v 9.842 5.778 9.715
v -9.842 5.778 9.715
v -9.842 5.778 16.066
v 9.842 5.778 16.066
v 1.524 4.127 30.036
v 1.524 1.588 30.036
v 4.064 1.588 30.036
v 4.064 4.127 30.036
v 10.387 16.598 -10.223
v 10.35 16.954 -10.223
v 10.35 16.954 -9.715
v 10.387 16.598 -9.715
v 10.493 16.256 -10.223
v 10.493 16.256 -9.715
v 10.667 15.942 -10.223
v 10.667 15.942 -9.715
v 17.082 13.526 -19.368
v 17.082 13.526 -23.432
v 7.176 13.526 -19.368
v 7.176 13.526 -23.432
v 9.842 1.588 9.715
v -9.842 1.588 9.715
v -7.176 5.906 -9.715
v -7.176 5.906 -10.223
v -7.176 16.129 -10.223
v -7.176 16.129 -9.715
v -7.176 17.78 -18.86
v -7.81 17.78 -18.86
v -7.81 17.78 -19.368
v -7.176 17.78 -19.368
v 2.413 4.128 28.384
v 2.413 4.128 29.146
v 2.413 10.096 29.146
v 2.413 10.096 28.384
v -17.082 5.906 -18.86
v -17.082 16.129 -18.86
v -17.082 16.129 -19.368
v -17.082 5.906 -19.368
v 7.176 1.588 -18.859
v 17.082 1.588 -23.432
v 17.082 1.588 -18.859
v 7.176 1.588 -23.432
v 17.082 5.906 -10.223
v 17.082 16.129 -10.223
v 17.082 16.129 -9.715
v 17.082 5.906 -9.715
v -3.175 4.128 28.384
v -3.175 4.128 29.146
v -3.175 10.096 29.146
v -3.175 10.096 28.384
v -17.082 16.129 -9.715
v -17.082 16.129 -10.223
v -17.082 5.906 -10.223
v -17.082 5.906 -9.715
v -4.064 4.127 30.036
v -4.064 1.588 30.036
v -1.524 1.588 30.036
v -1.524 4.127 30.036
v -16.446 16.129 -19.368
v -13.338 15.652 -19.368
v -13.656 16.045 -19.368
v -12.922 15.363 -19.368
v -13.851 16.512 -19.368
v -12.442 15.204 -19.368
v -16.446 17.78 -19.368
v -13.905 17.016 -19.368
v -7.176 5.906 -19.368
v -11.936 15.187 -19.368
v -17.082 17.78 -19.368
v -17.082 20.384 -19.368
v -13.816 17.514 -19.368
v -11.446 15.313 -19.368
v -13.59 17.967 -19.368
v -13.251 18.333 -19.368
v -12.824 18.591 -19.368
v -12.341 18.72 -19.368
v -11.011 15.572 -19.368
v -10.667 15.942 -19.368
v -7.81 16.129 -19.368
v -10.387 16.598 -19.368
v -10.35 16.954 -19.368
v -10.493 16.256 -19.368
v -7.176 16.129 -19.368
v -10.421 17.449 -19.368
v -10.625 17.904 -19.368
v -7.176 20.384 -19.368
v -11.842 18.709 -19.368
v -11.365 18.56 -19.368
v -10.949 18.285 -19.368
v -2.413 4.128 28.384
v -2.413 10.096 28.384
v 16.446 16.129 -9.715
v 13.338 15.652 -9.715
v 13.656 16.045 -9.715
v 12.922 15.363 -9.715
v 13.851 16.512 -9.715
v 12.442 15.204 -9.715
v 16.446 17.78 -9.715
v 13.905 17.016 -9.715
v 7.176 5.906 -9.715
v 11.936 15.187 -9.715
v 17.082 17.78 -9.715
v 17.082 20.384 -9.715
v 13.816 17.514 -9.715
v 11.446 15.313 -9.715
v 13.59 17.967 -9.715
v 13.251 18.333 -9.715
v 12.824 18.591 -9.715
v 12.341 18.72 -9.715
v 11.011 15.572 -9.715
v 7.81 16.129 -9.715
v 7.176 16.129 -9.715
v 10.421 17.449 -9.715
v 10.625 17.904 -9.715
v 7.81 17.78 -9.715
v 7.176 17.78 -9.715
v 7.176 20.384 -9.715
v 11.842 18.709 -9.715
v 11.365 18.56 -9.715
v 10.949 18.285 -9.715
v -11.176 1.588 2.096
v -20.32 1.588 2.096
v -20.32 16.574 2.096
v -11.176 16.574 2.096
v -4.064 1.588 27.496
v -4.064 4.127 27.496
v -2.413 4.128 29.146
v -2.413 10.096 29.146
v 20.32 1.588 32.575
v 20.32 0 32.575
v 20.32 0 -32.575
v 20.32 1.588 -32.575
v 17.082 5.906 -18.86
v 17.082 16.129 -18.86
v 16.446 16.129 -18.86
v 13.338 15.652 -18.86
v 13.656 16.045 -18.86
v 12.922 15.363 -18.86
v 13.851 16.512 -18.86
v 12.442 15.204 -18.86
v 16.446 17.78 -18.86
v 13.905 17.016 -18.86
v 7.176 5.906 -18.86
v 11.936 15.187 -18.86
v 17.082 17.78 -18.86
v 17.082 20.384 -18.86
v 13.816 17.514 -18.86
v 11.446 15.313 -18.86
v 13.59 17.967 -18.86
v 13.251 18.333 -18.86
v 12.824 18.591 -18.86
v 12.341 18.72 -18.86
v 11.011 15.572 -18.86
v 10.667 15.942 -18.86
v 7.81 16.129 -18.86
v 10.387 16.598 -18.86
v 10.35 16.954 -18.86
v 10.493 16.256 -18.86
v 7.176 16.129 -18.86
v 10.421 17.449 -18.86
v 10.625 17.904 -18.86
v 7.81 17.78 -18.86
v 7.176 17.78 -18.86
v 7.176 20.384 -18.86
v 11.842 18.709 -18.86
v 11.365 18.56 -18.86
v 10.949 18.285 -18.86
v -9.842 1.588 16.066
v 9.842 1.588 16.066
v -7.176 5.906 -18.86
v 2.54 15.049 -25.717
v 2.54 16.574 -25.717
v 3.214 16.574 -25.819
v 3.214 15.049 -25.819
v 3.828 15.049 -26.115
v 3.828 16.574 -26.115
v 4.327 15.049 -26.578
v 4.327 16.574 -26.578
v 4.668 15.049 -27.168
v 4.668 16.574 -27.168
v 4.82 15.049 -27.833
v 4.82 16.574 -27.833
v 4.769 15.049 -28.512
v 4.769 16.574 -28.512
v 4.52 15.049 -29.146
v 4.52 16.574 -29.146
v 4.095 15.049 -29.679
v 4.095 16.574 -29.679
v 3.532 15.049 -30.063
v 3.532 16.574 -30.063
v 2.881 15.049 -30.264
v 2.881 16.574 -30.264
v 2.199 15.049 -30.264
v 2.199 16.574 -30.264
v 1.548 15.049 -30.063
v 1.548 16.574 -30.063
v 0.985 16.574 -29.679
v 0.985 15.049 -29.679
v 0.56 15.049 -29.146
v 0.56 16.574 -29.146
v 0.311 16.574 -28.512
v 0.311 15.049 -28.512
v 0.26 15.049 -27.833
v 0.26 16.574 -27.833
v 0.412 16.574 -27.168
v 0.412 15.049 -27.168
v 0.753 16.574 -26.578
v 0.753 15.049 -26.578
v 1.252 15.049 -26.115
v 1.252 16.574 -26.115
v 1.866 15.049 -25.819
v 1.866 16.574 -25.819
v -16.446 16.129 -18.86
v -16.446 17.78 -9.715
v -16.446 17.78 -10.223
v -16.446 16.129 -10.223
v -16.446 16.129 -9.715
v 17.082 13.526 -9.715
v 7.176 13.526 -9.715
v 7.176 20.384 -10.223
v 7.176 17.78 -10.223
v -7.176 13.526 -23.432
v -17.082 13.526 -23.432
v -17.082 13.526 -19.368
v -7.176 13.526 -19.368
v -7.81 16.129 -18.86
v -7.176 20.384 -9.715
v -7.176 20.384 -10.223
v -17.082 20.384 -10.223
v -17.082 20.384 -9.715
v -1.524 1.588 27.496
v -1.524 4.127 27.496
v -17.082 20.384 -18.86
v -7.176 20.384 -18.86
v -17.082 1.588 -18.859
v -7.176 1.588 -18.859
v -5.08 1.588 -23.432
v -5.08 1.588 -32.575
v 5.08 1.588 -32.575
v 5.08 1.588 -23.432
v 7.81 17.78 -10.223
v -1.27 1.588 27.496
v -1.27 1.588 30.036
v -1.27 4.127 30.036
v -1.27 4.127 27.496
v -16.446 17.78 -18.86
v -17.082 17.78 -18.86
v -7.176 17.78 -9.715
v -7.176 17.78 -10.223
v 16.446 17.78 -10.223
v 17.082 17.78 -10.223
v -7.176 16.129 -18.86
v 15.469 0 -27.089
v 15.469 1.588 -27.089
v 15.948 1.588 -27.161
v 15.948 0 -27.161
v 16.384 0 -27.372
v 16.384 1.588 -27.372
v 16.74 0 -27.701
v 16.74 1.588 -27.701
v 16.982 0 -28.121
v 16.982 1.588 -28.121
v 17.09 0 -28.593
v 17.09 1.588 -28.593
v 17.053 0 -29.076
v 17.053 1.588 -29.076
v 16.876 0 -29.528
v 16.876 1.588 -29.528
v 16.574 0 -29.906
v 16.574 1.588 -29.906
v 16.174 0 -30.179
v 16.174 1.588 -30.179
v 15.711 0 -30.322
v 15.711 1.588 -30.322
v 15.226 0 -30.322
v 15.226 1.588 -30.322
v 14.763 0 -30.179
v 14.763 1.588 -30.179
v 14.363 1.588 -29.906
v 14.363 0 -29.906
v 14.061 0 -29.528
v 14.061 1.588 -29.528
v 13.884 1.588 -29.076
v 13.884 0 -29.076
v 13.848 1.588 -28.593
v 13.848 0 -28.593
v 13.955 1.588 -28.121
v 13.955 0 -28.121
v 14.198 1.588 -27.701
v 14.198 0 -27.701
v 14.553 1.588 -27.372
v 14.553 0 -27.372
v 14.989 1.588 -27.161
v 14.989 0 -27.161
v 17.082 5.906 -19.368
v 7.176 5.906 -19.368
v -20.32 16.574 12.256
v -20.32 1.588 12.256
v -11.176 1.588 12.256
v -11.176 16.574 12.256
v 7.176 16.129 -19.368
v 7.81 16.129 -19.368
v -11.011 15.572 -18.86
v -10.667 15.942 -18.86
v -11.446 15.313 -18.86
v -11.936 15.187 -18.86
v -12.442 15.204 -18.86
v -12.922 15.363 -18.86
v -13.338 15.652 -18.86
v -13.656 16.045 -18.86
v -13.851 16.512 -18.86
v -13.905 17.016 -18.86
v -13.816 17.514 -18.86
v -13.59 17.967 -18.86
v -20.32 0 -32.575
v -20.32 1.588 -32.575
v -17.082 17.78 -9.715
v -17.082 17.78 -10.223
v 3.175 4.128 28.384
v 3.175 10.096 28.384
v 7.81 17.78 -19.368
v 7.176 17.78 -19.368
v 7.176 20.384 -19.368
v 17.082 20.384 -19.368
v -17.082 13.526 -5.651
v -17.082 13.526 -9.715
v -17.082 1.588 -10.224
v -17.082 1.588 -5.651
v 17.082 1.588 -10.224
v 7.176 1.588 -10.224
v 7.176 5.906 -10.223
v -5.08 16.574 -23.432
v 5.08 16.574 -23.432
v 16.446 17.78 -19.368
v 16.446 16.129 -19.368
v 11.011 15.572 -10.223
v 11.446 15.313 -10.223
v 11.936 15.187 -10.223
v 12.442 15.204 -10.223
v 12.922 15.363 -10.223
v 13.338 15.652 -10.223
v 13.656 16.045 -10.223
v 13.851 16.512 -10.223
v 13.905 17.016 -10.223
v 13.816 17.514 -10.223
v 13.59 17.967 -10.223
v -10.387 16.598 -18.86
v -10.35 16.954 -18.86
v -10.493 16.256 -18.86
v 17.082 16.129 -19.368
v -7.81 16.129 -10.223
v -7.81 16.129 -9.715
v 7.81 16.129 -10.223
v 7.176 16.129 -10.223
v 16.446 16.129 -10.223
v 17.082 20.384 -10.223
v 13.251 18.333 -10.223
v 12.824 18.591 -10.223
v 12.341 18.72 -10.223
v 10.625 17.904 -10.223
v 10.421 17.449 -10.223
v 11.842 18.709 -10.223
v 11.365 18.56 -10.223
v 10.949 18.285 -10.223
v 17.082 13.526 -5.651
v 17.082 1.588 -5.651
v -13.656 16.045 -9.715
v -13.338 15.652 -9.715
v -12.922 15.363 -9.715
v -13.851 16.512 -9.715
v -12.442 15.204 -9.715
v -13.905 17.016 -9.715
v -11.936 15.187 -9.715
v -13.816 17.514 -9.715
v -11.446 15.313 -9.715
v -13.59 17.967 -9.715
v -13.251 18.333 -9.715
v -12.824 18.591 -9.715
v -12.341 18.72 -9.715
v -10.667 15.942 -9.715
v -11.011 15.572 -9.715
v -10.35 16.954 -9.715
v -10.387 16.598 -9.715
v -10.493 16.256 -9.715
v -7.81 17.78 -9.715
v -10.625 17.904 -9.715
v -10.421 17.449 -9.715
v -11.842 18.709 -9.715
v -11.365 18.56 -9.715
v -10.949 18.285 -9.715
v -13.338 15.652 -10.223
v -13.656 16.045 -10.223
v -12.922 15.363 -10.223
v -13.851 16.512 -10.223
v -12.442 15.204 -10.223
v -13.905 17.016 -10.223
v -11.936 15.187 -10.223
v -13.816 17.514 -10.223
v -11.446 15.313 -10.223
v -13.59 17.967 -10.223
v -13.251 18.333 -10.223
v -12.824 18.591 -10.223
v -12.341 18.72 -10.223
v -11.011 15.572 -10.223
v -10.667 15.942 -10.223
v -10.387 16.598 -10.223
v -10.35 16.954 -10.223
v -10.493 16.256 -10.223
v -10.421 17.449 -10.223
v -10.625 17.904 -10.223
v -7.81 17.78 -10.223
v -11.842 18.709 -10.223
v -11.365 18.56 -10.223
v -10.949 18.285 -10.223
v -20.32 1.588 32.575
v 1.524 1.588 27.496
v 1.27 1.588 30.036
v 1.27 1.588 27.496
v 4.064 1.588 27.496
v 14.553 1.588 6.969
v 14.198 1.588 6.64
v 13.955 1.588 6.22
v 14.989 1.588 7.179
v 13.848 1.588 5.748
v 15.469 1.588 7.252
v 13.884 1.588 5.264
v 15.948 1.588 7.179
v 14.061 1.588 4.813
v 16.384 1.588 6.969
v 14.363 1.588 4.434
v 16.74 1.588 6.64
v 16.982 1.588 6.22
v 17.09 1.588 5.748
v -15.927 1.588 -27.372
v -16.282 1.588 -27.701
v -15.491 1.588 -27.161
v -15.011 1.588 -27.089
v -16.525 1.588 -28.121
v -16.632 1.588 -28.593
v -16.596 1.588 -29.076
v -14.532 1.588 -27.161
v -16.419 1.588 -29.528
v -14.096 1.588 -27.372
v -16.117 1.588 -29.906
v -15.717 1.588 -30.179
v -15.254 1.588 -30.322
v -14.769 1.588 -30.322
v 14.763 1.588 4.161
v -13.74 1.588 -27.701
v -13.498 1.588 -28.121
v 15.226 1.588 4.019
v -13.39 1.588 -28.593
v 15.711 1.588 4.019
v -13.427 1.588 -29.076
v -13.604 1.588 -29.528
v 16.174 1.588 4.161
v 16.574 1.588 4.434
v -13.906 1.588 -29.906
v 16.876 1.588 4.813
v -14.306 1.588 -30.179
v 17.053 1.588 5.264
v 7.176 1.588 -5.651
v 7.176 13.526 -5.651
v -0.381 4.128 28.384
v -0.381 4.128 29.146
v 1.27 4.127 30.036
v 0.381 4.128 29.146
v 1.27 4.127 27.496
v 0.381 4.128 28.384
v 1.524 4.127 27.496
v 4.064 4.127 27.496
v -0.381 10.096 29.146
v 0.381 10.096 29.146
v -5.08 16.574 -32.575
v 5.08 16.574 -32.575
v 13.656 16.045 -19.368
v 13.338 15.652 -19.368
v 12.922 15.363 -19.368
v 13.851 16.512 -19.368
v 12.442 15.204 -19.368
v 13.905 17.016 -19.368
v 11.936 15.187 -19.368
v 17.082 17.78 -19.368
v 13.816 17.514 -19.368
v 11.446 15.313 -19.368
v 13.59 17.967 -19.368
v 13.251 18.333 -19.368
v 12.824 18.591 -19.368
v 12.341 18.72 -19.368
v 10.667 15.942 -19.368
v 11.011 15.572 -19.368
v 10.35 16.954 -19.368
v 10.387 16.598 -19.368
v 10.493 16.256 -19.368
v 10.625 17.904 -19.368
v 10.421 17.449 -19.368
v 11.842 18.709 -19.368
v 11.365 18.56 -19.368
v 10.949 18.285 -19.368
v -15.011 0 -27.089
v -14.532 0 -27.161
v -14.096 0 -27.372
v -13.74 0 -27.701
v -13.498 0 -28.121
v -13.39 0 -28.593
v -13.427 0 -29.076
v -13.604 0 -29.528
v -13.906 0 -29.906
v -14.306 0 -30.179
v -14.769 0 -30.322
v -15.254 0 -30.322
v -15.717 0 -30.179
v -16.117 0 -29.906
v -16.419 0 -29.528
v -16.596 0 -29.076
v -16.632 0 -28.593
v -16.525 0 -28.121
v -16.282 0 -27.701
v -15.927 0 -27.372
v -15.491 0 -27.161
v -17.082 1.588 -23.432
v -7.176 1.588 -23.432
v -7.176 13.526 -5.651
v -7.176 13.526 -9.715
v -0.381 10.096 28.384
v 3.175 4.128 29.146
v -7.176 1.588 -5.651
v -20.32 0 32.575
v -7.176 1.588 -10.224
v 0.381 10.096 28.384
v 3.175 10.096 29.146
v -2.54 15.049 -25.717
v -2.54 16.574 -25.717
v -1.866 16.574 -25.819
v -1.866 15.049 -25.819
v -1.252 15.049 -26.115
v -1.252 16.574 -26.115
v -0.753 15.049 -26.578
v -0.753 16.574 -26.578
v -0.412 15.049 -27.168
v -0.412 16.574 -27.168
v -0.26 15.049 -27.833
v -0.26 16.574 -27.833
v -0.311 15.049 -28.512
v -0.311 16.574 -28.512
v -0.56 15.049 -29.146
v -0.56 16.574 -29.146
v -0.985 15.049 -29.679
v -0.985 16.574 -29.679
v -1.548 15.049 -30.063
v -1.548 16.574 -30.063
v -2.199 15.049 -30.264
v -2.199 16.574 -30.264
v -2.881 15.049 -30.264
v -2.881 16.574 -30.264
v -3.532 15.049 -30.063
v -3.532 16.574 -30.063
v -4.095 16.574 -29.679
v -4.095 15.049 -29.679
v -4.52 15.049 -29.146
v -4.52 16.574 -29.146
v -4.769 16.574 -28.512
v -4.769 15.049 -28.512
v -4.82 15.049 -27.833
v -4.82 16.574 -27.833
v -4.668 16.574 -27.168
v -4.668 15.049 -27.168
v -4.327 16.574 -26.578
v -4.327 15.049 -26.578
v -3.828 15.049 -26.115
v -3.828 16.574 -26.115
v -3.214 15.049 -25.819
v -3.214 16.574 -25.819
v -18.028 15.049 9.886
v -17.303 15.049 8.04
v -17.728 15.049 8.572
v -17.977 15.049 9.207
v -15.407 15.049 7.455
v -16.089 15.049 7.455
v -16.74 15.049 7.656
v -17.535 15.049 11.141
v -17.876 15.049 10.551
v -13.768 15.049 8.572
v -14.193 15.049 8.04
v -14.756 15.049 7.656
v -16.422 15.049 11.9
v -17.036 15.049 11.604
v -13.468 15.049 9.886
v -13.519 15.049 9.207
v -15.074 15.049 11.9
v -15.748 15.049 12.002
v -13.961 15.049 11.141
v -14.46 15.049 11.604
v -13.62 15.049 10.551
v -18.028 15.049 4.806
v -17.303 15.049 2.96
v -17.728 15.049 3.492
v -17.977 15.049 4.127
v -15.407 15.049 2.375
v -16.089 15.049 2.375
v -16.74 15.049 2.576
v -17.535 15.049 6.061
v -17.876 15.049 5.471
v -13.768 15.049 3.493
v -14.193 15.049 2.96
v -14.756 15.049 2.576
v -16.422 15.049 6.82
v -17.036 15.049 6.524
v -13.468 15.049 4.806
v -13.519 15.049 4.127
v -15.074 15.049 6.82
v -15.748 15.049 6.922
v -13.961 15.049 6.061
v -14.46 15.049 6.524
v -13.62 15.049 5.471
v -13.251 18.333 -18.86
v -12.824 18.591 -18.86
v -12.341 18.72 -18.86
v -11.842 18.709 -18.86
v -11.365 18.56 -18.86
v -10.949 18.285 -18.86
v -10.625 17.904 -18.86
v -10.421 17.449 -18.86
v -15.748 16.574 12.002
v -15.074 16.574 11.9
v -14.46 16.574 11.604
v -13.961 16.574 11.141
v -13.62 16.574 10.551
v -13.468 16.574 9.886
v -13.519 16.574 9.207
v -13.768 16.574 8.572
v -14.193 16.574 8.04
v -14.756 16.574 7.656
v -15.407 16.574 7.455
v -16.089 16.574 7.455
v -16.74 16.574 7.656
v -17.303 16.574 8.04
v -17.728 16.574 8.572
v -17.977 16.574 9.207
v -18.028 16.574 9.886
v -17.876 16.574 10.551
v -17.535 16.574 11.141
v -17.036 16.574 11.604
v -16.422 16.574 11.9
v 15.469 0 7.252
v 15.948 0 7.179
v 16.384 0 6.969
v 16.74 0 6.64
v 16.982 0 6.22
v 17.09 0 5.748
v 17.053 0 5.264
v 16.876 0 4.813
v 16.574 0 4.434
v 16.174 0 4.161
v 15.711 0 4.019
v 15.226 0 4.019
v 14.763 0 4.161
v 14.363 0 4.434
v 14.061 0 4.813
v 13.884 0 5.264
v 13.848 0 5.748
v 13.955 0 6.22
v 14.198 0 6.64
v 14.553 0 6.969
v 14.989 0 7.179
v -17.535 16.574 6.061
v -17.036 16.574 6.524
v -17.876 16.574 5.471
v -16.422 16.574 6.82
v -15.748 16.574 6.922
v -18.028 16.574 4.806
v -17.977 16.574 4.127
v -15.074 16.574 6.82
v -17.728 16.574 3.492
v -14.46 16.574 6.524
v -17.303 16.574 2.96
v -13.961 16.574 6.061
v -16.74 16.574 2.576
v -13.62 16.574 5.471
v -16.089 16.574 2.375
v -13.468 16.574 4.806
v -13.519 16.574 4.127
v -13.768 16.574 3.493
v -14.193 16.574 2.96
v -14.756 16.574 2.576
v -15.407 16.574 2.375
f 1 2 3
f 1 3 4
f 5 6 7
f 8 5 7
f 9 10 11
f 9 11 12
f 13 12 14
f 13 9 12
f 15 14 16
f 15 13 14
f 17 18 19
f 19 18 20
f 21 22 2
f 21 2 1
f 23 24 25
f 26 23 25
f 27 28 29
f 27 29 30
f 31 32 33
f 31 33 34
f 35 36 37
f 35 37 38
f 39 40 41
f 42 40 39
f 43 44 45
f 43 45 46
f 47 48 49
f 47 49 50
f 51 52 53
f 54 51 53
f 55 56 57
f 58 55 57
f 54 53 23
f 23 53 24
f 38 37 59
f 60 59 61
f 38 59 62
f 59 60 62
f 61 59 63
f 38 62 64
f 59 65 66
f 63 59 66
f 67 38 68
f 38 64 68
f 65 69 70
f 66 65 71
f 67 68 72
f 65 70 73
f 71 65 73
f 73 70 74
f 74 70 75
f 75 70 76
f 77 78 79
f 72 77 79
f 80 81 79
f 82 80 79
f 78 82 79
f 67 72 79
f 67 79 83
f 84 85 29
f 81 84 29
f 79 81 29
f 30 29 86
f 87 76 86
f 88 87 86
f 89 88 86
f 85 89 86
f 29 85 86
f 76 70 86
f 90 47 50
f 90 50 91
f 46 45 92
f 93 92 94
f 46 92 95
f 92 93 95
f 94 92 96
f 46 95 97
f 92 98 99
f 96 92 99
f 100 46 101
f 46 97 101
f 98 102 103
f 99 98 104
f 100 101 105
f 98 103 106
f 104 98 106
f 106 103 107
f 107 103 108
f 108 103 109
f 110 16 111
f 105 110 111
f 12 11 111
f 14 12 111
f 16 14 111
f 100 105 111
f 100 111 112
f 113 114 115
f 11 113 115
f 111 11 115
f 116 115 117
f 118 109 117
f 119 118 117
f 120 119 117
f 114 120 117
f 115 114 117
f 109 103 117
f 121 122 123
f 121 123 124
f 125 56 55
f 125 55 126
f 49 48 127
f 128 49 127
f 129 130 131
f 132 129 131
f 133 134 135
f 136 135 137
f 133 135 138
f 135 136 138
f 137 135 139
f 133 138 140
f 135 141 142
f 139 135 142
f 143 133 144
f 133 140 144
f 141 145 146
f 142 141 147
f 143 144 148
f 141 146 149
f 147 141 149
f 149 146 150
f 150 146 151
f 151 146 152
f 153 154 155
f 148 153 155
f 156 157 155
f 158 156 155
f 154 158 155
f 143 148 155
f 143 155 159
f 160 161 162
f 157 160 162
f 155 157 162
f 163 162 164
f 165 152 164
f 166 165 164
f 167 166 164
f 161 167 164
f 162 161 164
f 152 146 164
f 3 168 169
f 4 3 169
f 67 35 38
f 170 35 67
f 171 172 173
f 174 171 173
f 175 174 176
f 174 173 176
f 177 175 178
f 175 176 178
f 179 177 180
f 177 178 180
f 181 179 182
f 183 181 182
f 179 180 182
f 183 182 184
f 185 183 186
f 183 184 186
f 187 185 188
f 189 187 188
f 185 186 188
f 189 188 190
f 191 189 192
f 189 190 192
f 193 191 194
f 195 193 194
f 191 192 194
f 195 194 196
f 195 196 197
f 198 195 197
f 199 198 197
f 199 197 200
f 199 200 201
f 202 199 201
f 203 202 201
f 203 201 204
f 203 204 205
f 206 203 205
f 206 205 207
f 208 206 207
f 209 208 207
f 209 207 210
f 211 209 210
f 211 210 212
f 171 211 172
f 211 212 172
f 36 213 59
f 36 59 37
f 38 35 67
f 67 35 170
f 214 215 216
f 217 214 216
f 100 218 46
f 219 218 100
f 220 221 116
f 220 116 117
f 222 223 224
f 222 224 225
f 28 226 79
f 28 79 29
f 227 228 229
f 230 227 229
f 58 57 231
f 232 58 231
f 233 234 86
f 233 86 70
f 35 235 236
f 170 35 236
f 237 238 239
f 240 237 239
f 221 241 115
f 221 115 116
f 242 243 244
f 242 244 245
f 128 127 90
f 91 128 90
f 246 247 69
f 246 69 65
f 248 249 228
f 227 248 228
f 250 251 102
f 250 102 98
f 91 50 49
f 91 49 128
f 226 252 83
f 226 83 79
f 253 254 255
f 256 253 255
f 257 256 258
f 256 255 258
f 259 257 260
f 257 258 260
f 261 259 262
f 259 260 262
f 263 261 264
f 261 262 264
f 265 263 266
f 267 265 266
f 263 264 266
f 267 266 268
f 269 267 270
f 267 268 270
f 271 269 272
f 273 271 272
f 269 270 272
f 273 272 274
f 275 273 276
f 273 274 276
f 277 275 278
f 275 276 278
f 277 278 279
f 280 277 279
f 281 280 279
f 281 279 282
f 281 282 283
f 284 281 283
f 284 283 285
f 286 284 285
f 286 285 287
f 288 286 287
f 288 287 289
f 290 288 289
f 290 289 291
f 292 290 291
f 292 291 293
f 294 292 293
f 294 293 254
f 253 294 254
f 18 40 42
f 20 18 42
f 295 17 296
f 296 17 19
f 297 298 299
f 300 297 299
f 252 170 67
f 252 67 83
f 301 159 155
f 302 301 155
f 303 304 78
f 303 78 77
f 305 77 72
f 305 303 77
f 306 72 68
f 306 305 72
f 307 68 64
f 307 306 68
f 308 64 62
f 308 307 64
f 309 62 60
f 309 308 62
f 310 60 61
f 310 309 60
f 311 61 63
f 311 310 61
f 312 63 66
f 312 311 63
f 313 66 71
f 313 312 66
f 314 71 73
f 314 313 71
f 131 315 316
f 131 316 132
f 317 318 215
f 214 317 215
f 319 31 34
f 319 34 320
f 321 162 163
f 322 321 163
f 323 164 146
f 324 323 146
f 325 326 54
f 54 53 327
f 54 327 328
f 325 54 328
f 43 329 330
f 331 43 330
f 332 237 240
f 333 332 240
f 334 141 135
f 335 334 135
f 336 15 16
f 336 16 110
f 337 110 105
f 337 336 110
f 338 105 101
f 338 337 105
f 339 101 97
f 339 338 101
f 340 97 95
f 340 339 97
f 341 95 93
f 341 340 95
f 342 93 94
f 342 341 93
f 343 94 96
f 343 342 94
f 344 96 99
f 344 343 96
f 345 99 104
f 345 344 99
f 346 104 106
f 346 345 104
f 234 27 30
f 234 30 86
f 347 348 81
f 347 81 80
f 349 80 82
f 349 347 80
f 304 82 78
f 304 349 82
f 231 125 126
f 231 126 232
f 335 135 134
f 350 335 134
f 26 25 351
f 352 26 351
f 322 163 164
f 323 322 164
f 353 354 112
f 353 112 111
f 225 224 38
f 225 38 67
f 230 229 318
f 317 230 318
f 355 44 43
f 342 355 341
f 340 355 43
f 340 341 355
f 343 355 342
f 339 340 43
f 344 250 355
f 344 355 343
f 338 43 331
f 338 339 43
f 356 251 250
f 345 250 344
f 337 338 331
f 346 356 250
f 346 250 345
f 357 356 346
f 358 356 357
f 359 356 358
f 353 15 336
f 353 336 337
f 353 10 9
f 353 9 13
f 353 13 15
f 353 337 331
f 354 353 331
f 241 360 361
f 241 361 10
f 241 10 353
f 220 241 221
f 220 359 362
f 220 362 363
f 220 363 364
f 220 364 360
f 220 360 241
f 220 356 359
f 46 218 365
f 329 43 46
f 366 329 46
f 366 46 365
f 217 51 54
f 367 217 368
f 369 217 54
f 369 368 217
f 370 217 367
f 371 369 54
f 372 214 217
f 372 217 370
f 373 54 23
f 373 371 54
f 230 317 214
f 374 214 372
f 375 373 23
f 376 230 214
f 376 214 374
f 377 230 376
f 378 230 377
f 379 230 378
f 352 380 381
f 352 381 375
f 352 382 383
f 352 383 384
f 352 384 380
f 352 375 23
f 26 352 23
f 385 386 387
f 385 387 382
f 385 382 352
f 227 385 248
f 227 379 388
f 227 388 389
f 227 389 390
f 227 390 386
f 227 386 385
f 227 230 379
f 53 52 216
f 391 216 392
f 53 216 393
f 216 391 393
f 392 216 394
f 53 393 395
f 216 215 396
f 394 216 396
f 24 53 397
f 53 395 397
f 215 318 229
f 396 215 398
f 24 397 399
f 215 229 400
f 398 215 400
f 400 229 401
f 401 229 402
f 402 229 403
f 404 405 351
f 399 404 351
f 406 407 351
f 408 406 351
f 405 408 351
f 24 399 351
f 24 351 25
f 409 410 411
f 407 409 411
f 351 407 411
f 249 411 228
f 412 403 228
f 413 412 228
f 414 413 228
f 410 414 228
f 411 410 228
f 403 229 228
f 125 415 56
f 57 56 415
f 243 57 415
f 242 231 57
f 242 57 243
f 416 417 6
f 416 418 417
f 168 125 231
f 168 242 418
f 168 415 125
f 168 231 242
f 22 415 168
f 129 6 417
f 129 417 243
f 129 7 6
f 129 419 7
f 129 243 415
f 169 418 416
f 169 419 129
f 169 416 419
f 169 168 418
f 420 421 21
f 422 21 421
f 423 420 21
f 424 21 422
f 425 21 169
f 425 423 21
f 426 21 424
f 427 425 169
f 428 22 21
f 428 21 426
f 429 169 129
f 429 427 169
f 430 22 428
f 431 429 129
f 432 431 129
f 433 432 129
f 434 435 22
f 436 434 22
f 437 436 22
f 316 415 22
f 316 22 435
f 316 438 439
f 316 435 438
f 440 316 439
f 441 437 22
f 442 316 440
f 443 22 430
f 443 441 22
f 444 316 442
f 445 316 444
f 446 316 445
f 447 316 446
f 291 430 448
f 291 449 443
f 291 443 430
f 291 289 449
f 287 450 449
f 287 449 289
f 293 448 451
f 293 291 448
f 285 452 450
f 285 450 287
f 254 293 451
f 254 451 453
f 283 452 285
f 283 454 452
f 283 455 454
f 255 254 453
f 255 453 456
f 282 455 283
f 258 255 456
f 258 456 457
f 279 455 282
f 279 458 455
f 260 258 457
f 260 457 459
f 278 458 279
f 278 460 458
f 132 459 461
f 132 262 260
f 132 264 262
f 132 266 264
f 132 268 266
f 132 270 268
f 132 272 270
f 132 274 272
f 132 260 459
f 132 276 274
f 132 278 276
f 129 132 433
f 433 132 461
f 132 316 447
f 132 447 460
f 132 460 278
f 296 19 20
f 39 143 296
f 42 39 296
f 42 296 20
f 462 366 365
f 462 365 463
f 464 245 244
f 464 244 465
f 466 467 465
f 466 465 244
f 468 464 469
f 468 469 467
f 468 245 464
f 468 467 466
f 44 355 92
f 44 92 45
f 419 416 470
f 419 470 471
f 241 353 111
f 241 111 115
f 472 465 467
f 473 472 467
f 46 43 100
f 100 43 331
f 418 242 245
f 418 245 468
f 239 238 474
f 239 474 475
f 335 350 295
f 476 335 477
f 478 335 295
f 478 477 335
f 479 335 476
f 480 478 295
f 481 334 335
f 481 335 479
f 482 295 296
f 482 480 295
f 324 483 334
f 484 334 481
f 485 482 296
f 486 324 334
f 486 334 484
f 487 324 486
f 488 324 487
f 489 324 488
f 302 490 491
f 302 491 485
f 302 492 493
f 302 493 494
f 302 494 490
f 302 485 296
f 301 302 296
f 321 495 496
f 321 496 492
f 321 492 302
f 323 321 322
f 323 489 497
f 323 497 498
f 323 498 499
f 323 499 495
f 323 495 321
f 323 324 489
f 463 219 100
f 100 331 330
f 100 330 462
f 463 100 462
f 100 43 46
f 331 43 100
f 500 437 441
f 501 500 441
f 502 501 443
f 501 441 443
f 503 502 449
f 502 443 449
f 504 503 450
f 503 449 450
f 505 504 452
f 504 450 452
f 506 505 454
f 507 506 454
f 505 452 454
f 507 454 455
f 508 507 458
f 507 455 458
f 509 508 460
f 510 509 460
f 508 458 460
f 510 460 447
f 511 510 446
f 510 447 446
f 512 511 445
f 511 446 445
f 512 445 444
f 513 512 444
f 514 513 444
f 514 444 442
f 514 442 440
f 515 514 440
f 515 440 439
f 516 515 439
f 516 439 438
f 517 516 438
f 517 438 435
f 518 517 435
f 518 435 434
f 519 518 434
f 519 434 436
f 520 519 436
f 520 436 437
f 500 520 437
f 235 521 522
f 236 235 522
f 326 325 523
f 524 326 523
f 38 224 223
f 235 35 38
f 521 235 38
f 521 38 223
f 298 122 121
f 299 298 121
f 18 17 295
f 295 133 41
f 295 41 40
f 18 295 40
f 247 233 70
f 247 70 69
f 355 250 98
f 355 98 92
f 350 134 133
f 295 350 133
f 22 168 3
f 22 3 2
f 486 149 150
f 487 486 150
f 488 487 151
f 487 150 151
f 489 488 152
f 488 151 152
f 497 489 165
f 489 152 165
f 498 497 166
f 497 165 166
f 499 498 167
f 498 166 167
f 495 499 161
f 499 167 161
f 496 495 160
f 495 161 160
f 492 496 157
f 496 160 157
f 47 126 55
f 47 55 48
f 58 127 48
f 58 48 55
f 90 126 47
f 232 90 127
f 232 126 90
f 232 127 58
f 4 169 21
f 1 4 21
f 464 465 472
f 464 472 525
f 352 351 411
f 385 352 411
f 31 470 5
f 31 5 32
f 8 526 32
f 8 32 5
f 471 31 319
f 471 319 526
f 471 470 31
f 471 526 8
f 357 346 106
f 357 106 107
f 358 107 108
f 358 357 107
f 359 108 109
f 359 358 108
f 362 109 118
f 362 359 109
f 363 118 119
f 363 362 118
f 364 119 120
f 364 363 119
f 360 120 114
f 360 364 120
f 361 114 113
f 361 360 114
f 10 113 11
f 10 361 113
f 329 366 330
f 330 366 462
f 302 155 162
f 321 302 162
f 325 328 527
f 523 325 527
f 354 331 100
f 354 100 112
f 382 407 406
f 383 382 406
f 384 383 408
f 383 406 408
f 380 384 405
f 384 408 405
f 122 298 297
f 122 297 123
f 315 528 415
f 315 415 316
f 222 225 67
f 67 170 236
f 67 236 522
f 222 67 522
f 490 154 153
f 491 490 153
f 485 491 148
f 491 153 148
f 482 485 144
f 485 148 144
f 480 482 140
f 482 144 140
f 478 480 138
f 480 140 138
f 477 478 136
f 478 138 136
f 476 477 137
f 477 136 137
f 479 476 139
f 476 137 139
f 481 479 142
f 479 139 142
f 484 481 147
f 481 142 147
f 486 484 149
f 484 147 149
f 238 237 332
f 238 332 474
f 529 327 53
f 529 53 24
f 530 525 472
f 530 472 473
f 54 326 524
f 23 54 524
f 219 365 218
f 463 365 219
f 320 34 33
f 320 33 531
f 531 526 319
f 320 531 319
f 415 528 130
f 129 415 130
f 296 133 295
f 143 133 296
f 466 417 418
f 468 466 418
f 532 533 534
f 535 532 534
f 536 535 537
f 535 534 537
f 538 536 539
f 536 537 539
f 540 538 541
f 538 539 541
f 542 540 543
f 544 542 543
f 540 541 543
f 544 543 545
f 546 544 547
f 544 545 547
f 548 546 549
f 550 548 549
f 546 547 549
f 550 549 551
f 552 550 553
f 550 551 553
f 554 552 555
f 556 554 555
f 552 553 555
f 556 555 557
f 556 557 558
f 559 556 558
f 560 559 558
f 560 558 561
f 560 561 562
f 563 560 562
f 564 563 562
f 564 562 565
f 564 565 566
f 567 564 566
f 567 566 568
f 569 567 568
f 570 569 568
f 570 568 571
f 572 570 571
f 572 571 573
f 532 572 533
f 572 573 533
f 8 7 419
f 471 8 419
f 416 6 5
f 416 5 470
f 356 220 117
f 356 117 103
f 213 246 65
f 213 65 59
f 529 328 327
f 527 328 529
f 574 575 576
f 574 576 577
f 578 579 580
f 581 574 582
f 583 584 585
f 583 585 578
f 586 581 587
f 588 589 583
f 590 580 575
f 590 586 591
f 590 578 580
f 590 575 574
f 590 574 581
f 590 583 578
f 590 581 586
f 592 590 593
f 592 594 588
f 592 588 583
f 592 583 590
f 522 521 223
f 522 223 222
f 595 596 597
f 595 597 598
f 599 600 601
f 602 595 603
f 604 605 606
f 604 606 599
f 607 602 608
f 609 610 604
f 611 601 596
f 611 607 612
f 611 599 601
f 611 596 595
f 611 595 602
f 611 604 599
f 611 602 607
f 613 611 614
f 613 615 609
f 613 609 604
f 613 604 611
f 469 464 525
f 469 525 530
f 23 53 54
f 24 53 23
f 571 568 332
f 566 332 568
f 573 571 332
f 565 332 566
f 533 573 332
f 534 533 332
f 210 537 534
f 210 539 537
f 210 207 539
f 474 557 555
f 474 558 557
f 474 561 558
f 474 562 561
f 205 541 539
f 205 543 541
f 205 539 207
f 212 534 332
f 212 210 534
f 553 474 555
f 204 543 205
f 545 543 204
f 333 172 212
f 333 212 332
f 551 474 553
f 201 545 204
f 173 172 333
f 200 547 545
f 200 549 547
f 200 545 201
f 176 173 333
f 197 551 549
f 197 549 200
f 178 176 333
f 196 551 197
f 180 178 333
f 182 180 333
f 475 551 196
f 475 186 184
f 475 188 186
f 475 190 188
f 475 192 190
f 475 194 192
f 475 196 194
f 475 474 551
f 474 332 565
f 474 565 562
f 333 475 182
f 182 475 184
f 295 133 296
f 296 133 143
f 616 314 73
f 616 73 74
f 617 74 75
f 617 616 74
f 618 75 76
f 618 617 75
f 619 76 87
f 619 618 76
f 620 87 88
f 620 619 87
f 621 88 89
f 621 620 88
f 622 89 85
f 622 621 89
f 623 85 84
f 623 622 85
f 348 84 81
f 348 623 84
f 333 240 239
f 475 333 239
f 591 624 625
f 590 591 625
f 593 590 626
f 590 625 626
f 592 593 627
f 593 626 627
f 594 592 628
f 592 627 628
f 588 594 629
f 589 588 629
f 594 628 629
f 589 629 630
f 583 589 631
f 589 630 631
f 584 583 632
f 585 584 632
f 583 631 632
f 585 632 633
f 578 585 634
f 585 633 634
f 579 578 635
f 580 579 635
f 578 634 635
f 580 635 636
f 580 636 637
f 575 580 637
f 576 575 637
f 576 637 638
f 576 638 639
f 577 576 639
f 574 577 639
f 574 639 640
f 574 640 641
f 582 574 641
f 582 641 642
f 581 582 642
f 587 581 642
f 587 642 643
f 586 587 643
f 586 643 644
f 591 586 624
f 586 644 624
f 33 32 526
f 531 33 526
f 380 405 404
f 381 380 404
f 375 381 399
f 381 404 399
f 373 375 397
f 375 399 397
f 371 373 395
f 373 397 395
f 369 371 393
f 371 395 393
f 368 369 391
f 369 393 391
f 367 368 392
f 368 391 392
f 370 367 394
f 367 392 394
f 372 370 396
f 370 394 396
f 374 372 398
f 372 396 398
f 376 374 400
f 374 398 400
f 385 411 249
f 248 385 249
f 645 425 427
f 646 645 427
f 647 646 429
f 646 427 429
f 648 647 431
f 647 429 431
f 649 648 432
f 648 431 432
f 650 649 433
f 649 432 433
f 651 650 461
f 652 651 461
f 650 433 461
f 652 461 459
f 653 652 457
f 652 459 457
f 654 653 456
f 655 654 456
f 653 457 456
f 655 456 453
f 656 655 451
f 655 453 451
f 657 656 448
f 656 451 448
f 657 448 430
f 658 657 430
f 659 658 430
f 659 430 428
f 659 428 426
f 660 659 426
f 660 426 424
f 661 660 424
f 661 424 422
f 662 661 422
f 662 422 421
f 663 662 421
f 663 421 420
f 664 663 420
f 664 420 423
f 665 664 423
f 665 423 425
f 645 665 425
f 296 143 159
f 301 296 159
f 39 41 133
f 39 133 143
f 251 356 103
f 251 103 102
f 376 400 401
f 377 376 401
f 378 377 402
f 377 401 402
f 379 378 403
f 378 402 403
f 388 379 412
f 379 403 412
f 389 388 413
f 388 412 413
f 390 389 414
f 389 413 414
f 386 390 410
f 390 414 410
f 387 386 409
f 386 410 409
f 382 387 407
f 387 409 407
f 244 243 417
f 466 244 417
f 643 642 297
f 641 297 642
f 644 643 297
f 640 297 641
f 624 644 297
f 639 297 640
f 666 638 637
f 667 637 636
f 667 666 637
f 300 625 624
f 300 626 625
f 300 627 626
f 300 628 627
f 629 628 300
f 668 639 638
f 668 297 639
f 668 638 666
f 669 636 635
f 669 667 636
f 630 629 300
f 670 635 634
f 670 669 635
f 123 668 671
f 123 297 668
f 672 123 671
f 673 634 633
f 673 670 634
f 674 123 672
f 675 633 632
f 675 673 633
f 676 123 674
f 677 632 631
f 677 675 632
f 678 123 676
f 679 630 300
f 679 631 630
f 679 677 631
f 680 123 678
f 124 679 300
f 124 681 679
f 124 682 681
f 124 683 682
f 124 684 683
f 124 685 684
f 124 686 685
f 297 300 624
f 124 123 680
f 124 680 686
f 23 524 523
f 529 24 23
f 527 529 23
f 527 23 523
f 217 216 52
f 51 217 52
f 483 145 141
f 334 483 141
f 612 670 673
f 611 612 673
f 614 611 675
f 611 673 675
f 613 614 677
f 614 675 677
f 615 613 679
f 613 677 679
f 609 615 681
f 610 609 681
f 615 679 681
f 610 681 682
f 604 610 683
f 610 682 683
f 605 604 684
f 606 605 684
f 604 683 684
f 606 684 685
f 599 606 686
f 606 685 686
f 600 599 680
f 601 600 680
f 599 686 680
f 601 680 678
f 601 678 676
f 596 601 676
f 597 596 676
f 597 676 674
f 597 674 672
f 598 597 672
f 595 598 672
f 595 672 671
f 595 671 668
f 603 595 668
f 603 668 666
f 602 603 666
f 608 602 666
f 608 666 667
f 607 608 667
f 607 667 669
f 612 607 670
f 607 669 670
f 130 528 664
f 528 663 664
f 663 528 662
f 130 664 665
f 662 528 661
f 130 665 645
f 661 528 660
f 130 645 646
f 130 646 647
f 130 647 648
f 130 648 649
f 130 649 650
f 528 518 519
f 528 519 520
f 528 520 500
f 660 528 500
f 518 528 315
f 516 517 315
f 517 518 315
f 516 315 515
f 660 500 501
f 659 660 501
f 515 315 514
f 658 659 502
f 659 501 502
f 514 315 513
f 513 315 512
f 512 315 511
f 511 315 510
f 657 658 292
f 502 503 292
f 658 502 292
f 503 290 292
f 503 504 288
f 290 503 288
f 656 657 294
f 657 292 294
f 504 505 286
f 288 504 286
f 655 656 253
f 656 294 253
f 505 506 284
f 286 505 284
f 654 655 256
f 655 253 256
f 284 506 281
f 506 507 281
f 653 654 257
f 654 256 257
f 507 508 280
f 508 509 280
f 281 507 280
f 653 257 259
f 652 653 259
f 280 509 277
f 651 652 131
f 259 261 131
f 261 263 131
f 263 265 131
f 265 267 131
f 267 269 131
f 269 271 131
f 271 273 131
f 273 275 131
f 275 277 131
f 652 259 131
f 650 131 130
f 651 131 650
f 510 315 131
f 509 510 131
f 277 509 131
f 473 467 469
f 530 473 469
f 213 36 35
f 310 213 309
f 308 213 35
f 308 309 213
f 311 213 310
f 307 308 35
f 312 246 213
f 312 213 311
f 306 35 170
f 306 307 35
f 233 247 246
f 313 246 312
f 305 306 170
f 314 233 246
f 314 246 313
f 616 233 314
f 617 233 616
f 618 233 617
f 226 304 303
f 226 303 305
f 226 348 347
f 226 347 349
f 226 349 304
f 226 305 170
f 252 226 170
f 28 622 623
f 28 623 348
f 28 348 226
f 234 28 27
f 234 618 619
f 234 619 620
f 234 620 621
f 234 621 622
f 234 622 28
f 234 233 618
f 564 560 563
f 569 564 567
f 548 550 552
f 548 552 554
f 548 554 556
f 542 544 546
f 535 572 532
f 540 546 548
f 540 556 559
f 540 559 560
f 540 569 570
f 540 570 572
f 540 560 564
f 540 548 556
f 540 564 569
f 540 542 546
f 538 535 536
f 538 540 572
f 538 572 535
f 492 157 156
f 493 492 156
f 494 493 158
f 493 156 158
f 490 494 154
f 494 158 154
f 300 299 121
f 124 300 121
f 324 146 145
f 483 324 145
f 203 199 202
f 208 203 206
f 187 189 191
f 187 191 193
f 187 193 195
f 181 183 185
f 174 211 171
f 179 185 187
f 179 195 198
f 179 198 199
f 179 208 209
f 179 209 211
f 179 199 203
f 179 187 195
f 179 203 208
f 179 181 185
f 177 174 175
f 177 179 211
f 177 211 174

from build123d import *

# Parameters (mm, degrees)
SKETCH1_W           = 40.64
SKETCH1_H           = 65.151
BOSS_EXTRUDE1_DEPTH = 1.5875
SKETCH2_R           = 1.6256
CUT_EXTRUDE1_DEPTH  = 39.426367985
SKETCH3_W           = 9.144
SKETCH3_H           = 10.16
SKETCH3_R           = 2.286
SKETCH3_W_2         = 10.16
SKETCH3_H_2         = 9.144
BOSS_EXTRUDE2_DEPTH = 14.986
CUT_EXTRUDE2_START  = 14.986
SKETCH3_3_R         = 2.286
CUT_EXTRUDE2_DEPTH  = 1.524
SKETCH4_W           = 9.906
SKETCH4_H           = 4.572
BOSS_EXTRUDE3_DEPTH = 11.938
SKETCH5_W           = 9.906
SKETCH5_H           = 7.62
BOSS_EXTRUDE4_DEPTH = 0.508
SKETCH5_3_W         = 9.906
SKETCH5_3_H         = 7.62
CUT_EXTRUDE3_DEPTH  = 0.508
SKETCH6_W           = 2.54
SKETCH6_H           = 2.54
BOSS_EXTRUDE5_DEPTH = 2.54
SKETCH7_W           = 0.762
SKETCH7_H           = 0.762
BOSS_EXTRUDE6_DEPTH = 5.969
SKETCH8_W           = 19.685
SKETCH8_H           = 6.35
BOSS_EXTRUDE7_DEPTH = 4.191


with BuildPart() as part:
    # Sketch1 → Boss-Extrude1 (new body)
    with BuildSketch(Plane(origin=(0, 0, 0), x_dir=(1, 0, 0), z_dir=(0, 1, 0))):
        Rectangle(SKETCH1_W, SKETCH1_H)
    extrude(amount=BOSS_EXTRUDE1_DEPTH)

    # Sketch2 → Cut-Extrude1 (cut, through all)
    with BuildSketch(Plane(origin=(0, 1.5875, 0), x_dir=(1, 0, 0), z_dir=(0, 1, 0))):
        with Locations(Location((-15.0114, 28.7147, 0), (0, 0, 270))):
            Circle(SKETCH2_R)
        with Locations(Location((15.4686, 28.7147, 0), (0, 0, 270))):
            Circle(SKETCH2_R)
        with Locations(Location((15.4686, -5.6261, 0), (0, 0, 270))):
            Circle(SKETCH2_R)
    extrude(amount=-CUT_EXTRUDE1_DEPTH, mode=Mode.SUBTRACT)

    # Sketch6 → Boss-Extrude5 (add)
    with BuildSketch(Plane(origin=(0, 1.5875, 0), x_dir=(1, 0, 0), z_dir=(0, 1, 0))):
        with Locations((0, -28.7655)):
            Rectangle(SKETCH6_W, SKETCH6_H)
        with Locations((2.794, -28.7655)):
            Rectangle(SKETCH6_W, SKETCH6_H)
        with Locations((-2.794, -28.7655)):
            Rectangle(SKETCH6_W, SKETCH6_H)
    extrude(amount=BOSS_EXTRUDE5_DEPTH)

    # Sketch7 → Boss-Extrude6 (add)
    with BuildSketch(Plane(origin=(0, 4.1275, 0), x_dir=(1, 0, 0), z_dir=(0, 1, 0))):
        with Locations((-2.794, -28.7655)):
            Rectangle(SKETCH7_W, SKETCH7_H)
        with Locations((0, -28.7655)):
            Rectangle(SKETCH7_W, SKETCH7_H)
        with Locations((2.794, -28.7655)):
            Rectangle(SKETCH7_W, SKETCH7_H)
    extrude(amount=BOSS_EXTRUDE6_DEPTH)

    # Sketch8 → Boss-Extrude7 (add)
    with BuildSketch(Plane(origin=(0, 1.5875, 0), x_dir=(1, 0, 0), z_dir=(0, 1, 0))):
        with Locations((0, -12.8905)):
            Rectangle(SKETCH8_W, SKETCH8_H)
    extrude(amount=BOSS_EXTRUDE7_DEPTH)


with BuildPart() as body_2:
    # Sketch3 → Boss-Extrude2 (new body)
    # profile 1 of 6: a face of its own
    with BuildSketch(Plane(origin=(0, 1.5875, 0), x_dir=(1, 0, 0), z_dir=(0, 1, 0))):
        with Locations((-15.748, -7.1755)):
            Rectangle(SKETCH3_W, SKETCH3_H)
        with Locations((-15.748, -9.7155)):
            Circle(SKETCH3_R, mode=Mode.SUBTRACT)
        with Locations((-15.748, -4.6355)):
            Circle(SKETCH3_R, mode=Mode.SUBTRACT)
    # profile 2 of 6: a face of its own
    with BuildSketch(Plane(origin=(0, 1.5875, 0), x_dir=(1, 0, 0), z_dir=(0, 1, 0))):
        with Locations((-15.748, -4.6355)):
            Circle(SKETCH3_R)
    # profile 3 of 6: a face of its own
    with BuildSketch(Plane(origin=(0, 1.5875, 0), x_dir=(1, 0, 0), z_dir=(0, 1, 0))):
        with Locations((-15.748, -9.7155)):
            Circle(SKETCH3_R)
    # profile 4 of 6: a face of its own
    with BuildSketch(Plane(origin=(0, 1.5875, 0), x_dir=(1, 0, 0), z_dir=(0, 1, 0))):
        with Locations((0, 28.0035)):
            Rectangle(SKETCH3_W_2, SKETCH3_H_2)
        with Locations((-2.54, 28.0035)):
            Circle(SKETCH3_R, mode=Mode.SUBTRACT)
        with Locations((2.54, 28.0035)):
            Circle(SKETCH3_R, mode=Mode.SUBTRACT)
    # profile 5 of 6: a face of its own
    with BuildSketch(Plane(origin=(0, 1.5875, 0), x_dir=(1, 0, 0), z_dir=(0, 1, 0))):
        with Locations((2.54, 28.0035)):
            Circle(SKETCH3_R)
    # profile 6 of 6: a face of its own
    with BuildSketch(Plane(origin=(0, 1.5875, 0), x_dir=(1, 0, 0), z_dir=(0, 1, 0))):
        with Locations((-2.54, 28.0035)):
            Circle(SKETCH3_R)
    extrude(amount=BOSS_EXTRUDE2_DEPTH)

    # Sketch3<3> → Cut-Extrude2 (cut)
    with BuildSketch(Plane(origin=(0, 1.5875, 0), x_dir=(1, 0, 0), z_dir=(0, 1, 0)).offset(CUT_EXTRUDE2_START)):
        with Locations(Location((-15.748, -9.7155, 0), (0, 0, 270))):
            Circle(SKETCH3_3_R)
        with Locations(Location((-15.748, -4.6355, 0), (0, 0, 270))):
            Circle(SKETCH3_3_R)
        with Locations(Location((2.54, 28.0035, 0), (0, 0, 270))):
            Circle(SKETCH3_3_R)
        with Locations(Location((-2.54, 28.0035, 0), (0, 0, 270))):
            Circle(SKETCH3_3_R)
    extrude(amount=-CUT_EXTRUDE2_DEPTH, mode=Mode.SUBTRACT)


with BuildPart() as body_3:
    # Sketch4 → Boss-Extrude3 (new body)
    with BuildSketch(Plane(origin=(0, 1.5875, 0), x_dir=(1, 0, 0), z_dir=(0, 1, 0))):
        with Locations((-12.1285, 21.1455)):
            Rectangle(SKETCH4_W, SKETCH4_H)
    extrude(amount=BOSS_EXTRUDE3_DEPTH)

    # Sketch5<3> → Cut-Extrude3 (cut)
    with BuildSketch(Plane.XY.offset(-18.8595)):
        with Locations((-12.1285, 9.7155)):
            Rectangle(SKETCH5_3_W, SKETCH5_3_H)
    extrude(amount=-CUT_EXTRUDE3_DEPTH, mode=Mode.SUBTRACT)


with BuildPart() as body_4:
    # Sketch5 → Boss-Extrude4 (new body)
    with BuildSketch(Plane.XY.offset(-18.8595)):
        with BuildLine():
            Line((-17.0815, 13.5255), (-7.1755, 13.5255))
            Line((-7.1755, 13.5255), (-10.666642283, 15.942444658))
            ThreePointArc((-10.666642283, 15.942444658), (-13.140555342, 15.492642283), (-13.590357717, 17.966555342))
            Line((-13.590357717, 17.966555342), (-17.0815, 20.3835))
            Line((-17.0815, 20.3835), (-17.0815, 17.78))
            Line((-17.0815, 17.78), (-16.4465, 17.78))
            Line((-16.4465, 17.78), (-16.4465, 16.129))
            Line((-16.4465, 16.129), (-17.0815, 16.129))
            Line((-17.0815, 16.129), (-17.0815, 13.5255))
        make_face()
        with BuildLine():
            Line((-10.666642283, 15.942444658), (-7.1755, 13.5255))
            Line((-7.1755, 13.5255), (-7.1755, 16.129))
            Line((-7.1755, 16.129), (-7.8105, 16.129))
            Line((-7.8105, 16.129), (-7.8105, 17.78))
            Line((-7.8105, 17.78), (-7.1755, 17.78))
            Line((-7.1755, 17.78), (-7.1755, 20.3835))
            Line((-7.1755, 20.3835), (-17.0815, 20.3835))
            Line((-17.0815, 20.3835), (-13.590357717, 17.966555342))
            ThreePointArc((-13.590357717, 17.966555342), (-11.598358047, 18.651625072), (-10.3505, 16.9545))
            ThreePointArc((-10.3505, 16.9545), (-10.431374928, 16.424358047), (-10.666642283, 15.942444658))
        make_face()
        with Locations((-12.1285, 9.7155)):
            Rectangle(SKETCH5_W, SKETCH5_H)
    extrude(amount=-BOSS_EXTRUDE4_DEPTH)


with BuildPart() as body_5:
    # Mirror5: mirrored copy
    add(body_3.part.mirror(Plane(origin=(0, 0, 0), x_dir=(0, 0, 1), z_dir=(1, 0, 0))))


with BuildPart() as body_6:
    # Mirror5 2: mirrored copy
    add(body_4.part.mirror(Plane(origin=(0, 0, 0), x_dir=(0, 0, 1), z_dir=(1, 0, 0))))


with BuildPart() as body_7:
    # Mirror6: mirrored copy
    add(body_3.part.mirror(Plane.XY.offset(-14.5415)))


with BuildPart() as body_8:
    # Mirror6 2: mirrored copy
    add(body_4.part.mirror(Plane.XY.offset(-14.5415)))


with BuildPart() as body_9:
    # Mirror6 3: mirrored copy
    add(body_6.part.mirror(Plane.XY.offset(-14.5415)))


with BuildPart() as body_10:
    # Mirror6 4: mirrored copy
    add(body_5.part.mirror(Plane.XY.offset(-14.5415)))


solid = Compound([part.part, body_2.part, body_3.part, body_4.part, body_5.part, body_6.part, body_7.part, body_8.part, body_9.part, body_10.part])
